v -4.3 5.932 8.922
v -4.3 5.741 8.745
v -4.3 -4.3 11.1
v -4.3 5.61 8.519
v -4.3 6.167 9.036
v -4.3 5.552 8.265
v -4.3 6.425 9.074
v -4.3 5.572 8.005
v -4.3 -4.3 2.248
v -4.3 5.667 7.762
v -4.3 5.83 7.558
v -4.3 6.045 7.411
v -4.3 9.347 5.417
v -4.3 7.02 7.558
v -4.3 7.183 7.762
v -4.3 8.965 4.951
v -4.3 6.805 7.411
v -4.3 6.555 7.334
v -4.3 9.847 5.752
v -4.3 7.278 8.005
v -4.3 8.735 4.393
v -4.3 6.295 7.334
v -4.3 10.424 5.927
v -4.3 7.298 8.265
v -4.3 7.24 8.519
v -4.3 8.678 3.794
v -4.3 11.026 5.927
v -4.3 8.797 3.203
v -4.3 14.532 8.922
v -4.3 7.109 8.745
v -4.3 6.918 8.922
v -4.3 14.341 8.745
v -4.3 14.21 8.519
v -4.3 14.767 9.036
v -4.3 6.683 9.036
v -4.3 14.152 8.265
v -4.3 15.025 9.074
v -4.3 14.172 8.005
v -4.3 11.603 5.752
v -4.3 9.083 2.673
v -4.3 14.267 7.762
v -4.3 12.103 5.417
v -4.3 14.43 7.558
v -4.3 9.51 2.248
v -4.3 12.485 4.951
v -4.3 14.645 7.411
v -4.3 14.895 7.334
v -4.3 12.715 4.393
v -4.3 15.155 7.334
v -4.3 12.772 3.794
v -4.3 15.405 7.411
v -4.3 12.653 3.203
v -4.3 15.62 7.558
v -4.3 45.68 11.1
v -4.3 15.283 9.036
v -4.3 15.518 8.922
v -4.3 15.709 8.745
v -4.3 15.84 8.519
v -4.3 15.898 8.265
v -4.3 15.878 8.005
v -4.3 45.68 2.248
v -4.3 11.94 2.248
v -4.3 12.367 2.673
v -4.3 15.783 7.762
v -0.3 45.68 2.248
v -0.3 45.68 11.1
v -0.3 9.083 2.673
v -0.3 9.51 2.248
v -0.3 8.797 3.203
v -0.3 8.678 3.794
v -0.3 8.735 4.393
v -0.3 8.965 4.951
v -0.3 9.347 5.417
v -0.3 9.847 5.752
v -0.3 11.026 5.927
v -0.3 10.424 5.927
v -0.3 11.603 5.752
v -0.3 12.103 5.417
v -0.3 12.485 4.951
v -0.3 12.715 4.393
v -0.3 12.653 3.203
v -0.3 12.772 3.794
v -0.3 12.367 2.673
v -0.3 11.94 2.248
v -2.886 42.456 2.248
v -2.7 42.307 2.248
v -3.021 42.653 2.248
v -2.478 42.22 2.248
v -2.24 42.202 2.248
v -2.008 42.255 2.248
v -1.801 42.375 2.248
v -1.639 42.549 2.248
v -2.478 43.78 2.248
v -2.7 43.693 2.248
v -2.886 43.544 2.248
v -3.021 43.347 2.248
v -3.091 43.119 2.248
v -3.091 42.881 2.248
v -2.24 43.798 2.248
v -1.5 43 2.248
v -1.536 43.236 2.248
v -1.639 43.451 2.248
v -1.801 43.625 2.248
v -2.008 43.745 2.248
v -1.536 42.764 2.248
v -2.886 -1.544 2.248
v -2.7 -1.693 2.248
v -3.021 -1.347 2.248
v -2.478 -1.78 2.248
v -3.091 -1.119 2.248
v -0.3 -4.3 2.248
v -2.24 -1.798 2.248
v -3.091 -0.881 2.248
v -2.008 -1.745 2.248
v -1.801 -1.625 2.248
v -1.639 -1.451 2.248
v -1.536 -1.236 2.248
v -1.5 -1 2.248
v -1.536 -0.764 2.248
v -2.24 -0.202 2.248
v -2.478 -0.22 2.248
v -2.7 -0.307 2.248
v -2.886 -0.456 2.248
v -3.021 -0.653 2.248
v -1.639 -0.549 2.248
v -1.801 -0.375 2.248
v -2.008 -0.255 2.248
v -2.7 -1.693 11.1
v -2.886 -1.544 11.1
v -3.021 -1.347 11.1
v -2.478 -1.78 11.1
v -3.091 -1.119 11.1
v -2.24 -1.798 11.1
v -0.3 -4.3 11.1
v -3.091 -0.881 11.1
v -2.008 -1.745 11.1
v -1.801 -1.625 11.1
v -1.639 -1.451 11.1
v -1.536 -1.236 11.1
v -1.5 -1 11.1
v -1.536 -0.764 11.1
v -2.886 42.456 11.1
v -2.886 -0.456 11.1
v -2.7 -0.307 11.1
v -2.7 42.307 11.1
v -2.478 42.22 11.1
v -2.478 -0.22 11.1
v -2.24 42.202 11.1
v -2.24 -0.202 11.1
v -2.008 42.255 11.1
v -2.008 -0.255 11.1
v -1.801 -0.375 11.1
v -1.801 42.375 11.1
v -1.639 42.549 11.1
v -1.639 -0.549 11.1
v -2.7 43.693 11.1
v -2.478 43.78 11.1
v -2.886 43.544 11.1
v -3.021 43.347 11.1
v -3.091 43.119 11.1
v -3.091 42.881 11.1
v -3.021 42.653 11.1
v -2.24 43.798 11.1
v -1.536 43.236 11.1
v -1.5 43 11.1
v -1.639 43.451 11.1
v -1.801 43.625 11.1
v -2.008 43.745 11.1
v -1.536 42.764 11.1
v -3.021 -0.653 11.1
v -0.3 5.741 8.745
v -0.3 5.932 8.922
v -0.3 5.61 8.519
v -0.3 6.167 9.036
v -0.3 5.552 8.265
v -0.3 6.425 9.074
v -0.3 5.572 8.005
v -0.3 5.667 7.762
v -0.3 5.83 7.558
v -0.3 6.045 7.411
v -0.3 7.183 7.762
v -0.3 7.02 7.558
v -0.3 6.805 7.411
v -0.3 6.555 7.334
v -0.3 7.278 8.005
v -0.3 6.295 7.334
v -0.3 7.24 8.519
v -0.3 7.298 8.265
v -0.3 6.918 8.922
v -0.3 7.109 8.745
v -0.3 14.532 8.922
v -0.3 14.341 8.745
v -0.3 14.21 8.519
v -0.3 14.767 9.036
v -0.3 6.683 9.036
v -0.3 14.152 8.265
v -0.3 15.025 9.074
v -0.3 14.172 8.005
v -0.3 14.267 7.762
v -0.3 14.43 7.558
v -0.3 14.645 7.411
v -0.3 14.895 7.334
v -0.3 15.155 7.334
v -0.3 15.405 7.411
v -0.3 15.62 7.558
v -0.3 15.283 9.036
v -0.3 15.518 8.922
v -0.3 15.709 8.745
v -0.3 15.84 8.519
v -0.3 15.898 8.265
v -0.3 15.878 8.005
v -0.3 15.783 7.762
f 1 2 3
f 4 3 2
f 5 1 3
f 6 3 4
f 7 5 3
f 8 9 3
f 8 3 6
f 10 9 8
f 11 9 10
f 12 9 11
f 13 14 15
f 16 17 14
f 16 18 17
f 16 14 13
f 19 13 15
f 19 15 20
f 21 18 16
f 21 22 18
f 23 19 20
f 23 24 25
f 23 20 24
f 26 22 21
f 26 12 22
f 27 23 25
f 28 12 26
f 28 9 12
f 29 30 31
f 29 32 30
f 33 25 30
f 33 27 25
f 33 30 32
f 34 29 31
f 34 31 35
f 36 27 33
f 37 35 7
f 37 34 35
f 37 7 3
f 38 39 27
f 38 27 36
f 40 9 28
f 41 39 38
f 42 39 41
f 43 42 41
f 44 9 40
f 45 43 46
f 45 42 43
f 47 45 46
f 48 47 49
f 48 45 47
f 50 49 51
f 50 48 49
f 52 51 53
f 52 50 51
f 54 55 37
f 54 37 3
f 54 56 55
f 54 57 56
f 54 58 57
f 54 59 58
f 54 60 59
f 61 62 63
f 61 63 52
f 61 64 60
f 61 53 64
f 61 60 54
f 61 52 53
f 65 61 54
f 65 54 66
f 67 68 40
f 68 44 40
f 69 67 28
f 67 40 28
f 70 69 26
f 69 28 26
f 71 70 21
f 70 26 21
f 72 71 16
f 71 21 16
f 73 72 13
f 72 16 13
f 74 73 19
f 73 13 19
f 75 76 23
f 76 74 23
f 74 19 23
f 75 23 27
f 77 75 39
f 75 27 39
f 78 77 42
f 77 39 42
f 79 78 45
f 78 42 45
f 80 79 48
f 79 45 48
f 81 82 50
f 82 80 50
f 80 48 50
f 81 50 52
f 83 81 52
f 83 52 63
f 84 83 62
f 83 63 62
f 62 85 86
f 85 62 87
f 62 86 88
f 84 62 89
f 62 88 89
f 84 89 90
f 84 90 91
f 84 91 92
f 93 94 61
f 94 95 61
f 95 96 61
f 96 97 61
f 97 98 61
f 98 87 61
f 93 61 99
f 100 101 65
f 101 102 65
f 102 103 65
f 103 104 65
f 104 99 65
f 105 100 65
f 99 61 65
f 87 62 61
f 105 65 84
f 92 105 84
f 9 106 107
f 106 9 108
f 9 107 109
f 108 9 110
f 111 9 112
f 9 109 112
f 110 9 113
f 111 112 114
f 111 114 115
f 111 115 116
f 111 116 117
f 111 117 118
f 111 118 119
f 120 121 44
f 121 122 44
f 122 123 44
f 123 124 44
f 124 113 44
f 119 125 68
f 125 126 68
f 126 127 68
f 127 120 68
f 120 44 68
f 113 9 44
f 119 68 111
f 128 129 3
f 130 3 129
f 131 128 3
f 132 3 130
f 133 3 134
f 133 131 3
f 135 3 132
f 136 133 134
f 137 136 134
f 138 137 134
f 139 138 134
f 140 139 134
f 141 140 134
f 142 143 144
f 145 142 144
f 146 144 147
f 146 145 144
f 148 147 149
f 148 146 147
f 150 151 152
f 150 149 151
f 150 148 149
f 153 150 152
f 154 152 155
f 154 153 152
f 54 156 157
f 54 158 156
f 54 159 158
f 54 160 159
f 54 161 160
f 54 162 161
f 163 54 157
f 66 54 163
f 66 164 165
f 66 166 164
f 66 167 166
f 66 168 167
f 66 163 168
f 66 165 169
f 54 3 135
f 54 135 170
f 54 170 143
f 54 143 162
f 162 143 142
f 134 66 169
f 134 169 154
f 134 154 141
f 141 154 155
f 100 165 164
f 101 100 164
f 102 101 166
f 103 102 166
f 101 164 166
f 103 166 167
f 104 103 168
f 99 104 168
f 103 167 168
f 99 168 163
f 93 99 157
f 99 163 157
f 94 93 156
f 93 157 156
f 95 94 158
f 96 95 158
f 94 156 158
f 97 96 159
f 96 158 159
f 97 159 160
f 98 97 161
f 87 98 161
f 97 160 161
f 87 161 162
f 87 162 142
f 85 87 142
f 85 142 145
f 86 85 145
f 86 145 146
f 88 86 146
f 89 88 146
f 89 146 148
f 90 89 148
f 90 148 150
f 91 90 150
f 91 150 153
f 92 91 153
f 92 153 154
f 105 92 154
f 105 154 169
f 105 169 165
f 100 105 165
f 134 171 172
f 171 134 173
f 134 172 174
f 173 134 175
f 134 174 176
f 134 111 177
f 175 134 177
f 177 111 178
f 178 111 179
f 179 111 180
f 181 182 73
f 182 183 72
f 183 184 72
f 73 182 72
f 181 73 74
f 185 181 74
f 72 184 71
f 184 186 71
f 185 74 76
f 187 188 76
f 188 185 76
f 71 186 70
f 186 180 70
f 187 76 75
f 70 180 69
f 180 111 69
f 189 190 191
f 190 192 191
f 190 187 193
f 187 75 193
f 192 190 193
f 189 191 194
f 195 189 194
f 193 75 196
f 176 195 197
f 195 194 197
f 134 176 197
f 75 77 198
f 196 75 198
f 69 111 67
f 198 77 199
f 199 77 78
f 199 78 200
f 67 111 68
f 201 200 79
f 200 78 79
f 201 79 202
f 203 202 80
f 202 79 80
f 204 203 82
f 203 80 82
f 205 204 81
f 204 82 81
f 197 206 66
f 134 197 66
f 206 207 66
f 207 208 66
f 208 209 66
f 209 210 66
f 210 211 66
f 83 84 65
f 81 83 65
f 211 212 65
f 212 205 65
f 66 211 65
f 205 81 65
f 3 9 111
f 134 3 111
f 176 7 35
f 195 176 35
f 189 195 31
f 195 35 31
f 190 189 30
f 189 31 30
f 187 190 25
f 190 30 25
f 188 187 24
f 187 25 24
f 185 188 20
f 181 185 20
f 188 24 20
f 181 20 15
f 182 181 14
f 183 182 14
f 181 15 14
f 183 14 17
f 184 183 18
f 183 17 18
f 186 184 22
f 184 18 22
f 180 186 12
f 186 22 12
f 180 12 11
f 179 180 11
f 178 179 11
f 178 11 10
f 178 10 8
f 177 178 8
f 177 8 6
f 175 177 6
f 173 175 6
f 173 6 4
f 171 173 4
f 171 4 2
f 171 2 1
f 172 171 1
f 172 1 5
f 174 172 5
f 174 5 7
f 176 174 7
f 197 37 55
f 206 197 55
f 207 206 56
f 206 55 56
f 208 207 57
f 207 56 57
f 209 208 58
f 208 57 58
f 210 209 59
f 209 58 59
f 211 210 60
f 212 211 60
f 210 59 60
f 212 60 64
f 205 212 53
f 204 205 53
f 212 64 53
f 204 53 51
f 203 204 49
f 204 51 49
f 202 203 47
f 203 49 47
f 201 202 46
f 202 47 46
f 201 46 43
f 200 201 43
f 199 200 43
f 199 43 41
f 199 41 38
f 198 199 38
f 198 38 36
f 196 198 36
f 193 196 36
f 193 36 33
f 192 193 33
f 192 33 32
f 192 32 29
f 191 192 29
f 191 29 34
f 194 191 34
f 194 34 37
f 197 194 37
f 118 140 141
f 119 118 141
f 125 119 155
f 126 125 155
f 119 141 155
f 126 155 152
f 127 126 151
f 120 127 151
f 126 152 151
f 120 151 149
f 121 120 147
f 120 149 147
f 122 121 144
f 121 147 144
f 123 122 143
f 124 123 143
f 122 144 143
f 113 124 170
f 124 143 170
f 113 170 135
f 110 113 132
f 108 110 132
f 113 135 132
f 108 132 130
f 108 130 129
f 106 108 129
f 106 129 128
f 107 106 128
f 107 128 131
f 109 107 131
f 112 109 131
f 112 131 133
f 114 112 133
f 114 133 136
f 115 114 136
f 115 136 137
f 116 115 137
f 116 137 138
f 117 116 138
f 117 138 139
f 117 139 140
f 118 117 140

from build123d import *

# Parameters (mm, degrees)
SKETCH_1_W                      = 4
SKETCH_1_H                      = 49.98
LEFT_RF_PLATE_DEPTH             = 8.851909566
SKETCH_2_R                      = 0.8
FRAME_2XD1P6_THROUGH_DEPTH      = 47.728029093
SKETCH_3_R                      = 2.05
SMA_CENTER_D4P1_DEPTH           = 4
SKETCH_4_R                      = 0.875
SMA_UPPER_2XD1P75_THROUGH_DEPTH = 48.179152176


with BuildPart() as part:
    # 草图1 → Left_RF_Plate (new body)
    with BuildSketch(Plane.XY):
        with Locations((-2.3, 20.69)):
            Rectangle(SKETCH_1_W, SKETCH_1_H)
    extrude(amount=LEFT_RF_PLATE_DEPTH)


with BuildPart() as part_1:
    # Stock_Z_Position: moved
    add(part.part.moved(Location((0, 0, 2.248090434))))

    # 草图2 → Frame_2xD1p6_Through (cut, through all)
    with BuildSketch(Plane.XY.offset(11.1)):
        with Locations((-2.3, -1)):
            Circle(SKETCH_2_R)
        with Locations((-2.3, 43)):
            Circle(SKETCH_2_R)
    extrude(amount=-FRAME_2XD1P6_THROUGH_DEPTH, mode=Mode.SUBTRACT)

    # 草图3 → SMA_Center_D4p1 (cut)
    with BuildSketch(Plane.ZY.offset(4.3)):
        with Locations((3.899496327, 10.725)):
            Circle(SKETCH_3_R)
    extrude(amount=-SMA_CENTER_D4P1_DEPTH, mode=Mode.SUBTRACT)

    # 草图4 → SMA_Upper_2xD1p75_Through (cut, through all)
    with BuildSketch(Plane.ZY.offset(4.3)):
        with Locations((8.199496327, 6.425)):
            Circle(SKETCH_4_R)
        with Locations((8.199496327, 15.025)):
            Circle(SKETCH_4_R)
    extrude(amount=-SMA_UPPER_2XD1P75_THROUGH_DEPTH, mode=Mode.SUBTRACT)


solid = part_1.part
